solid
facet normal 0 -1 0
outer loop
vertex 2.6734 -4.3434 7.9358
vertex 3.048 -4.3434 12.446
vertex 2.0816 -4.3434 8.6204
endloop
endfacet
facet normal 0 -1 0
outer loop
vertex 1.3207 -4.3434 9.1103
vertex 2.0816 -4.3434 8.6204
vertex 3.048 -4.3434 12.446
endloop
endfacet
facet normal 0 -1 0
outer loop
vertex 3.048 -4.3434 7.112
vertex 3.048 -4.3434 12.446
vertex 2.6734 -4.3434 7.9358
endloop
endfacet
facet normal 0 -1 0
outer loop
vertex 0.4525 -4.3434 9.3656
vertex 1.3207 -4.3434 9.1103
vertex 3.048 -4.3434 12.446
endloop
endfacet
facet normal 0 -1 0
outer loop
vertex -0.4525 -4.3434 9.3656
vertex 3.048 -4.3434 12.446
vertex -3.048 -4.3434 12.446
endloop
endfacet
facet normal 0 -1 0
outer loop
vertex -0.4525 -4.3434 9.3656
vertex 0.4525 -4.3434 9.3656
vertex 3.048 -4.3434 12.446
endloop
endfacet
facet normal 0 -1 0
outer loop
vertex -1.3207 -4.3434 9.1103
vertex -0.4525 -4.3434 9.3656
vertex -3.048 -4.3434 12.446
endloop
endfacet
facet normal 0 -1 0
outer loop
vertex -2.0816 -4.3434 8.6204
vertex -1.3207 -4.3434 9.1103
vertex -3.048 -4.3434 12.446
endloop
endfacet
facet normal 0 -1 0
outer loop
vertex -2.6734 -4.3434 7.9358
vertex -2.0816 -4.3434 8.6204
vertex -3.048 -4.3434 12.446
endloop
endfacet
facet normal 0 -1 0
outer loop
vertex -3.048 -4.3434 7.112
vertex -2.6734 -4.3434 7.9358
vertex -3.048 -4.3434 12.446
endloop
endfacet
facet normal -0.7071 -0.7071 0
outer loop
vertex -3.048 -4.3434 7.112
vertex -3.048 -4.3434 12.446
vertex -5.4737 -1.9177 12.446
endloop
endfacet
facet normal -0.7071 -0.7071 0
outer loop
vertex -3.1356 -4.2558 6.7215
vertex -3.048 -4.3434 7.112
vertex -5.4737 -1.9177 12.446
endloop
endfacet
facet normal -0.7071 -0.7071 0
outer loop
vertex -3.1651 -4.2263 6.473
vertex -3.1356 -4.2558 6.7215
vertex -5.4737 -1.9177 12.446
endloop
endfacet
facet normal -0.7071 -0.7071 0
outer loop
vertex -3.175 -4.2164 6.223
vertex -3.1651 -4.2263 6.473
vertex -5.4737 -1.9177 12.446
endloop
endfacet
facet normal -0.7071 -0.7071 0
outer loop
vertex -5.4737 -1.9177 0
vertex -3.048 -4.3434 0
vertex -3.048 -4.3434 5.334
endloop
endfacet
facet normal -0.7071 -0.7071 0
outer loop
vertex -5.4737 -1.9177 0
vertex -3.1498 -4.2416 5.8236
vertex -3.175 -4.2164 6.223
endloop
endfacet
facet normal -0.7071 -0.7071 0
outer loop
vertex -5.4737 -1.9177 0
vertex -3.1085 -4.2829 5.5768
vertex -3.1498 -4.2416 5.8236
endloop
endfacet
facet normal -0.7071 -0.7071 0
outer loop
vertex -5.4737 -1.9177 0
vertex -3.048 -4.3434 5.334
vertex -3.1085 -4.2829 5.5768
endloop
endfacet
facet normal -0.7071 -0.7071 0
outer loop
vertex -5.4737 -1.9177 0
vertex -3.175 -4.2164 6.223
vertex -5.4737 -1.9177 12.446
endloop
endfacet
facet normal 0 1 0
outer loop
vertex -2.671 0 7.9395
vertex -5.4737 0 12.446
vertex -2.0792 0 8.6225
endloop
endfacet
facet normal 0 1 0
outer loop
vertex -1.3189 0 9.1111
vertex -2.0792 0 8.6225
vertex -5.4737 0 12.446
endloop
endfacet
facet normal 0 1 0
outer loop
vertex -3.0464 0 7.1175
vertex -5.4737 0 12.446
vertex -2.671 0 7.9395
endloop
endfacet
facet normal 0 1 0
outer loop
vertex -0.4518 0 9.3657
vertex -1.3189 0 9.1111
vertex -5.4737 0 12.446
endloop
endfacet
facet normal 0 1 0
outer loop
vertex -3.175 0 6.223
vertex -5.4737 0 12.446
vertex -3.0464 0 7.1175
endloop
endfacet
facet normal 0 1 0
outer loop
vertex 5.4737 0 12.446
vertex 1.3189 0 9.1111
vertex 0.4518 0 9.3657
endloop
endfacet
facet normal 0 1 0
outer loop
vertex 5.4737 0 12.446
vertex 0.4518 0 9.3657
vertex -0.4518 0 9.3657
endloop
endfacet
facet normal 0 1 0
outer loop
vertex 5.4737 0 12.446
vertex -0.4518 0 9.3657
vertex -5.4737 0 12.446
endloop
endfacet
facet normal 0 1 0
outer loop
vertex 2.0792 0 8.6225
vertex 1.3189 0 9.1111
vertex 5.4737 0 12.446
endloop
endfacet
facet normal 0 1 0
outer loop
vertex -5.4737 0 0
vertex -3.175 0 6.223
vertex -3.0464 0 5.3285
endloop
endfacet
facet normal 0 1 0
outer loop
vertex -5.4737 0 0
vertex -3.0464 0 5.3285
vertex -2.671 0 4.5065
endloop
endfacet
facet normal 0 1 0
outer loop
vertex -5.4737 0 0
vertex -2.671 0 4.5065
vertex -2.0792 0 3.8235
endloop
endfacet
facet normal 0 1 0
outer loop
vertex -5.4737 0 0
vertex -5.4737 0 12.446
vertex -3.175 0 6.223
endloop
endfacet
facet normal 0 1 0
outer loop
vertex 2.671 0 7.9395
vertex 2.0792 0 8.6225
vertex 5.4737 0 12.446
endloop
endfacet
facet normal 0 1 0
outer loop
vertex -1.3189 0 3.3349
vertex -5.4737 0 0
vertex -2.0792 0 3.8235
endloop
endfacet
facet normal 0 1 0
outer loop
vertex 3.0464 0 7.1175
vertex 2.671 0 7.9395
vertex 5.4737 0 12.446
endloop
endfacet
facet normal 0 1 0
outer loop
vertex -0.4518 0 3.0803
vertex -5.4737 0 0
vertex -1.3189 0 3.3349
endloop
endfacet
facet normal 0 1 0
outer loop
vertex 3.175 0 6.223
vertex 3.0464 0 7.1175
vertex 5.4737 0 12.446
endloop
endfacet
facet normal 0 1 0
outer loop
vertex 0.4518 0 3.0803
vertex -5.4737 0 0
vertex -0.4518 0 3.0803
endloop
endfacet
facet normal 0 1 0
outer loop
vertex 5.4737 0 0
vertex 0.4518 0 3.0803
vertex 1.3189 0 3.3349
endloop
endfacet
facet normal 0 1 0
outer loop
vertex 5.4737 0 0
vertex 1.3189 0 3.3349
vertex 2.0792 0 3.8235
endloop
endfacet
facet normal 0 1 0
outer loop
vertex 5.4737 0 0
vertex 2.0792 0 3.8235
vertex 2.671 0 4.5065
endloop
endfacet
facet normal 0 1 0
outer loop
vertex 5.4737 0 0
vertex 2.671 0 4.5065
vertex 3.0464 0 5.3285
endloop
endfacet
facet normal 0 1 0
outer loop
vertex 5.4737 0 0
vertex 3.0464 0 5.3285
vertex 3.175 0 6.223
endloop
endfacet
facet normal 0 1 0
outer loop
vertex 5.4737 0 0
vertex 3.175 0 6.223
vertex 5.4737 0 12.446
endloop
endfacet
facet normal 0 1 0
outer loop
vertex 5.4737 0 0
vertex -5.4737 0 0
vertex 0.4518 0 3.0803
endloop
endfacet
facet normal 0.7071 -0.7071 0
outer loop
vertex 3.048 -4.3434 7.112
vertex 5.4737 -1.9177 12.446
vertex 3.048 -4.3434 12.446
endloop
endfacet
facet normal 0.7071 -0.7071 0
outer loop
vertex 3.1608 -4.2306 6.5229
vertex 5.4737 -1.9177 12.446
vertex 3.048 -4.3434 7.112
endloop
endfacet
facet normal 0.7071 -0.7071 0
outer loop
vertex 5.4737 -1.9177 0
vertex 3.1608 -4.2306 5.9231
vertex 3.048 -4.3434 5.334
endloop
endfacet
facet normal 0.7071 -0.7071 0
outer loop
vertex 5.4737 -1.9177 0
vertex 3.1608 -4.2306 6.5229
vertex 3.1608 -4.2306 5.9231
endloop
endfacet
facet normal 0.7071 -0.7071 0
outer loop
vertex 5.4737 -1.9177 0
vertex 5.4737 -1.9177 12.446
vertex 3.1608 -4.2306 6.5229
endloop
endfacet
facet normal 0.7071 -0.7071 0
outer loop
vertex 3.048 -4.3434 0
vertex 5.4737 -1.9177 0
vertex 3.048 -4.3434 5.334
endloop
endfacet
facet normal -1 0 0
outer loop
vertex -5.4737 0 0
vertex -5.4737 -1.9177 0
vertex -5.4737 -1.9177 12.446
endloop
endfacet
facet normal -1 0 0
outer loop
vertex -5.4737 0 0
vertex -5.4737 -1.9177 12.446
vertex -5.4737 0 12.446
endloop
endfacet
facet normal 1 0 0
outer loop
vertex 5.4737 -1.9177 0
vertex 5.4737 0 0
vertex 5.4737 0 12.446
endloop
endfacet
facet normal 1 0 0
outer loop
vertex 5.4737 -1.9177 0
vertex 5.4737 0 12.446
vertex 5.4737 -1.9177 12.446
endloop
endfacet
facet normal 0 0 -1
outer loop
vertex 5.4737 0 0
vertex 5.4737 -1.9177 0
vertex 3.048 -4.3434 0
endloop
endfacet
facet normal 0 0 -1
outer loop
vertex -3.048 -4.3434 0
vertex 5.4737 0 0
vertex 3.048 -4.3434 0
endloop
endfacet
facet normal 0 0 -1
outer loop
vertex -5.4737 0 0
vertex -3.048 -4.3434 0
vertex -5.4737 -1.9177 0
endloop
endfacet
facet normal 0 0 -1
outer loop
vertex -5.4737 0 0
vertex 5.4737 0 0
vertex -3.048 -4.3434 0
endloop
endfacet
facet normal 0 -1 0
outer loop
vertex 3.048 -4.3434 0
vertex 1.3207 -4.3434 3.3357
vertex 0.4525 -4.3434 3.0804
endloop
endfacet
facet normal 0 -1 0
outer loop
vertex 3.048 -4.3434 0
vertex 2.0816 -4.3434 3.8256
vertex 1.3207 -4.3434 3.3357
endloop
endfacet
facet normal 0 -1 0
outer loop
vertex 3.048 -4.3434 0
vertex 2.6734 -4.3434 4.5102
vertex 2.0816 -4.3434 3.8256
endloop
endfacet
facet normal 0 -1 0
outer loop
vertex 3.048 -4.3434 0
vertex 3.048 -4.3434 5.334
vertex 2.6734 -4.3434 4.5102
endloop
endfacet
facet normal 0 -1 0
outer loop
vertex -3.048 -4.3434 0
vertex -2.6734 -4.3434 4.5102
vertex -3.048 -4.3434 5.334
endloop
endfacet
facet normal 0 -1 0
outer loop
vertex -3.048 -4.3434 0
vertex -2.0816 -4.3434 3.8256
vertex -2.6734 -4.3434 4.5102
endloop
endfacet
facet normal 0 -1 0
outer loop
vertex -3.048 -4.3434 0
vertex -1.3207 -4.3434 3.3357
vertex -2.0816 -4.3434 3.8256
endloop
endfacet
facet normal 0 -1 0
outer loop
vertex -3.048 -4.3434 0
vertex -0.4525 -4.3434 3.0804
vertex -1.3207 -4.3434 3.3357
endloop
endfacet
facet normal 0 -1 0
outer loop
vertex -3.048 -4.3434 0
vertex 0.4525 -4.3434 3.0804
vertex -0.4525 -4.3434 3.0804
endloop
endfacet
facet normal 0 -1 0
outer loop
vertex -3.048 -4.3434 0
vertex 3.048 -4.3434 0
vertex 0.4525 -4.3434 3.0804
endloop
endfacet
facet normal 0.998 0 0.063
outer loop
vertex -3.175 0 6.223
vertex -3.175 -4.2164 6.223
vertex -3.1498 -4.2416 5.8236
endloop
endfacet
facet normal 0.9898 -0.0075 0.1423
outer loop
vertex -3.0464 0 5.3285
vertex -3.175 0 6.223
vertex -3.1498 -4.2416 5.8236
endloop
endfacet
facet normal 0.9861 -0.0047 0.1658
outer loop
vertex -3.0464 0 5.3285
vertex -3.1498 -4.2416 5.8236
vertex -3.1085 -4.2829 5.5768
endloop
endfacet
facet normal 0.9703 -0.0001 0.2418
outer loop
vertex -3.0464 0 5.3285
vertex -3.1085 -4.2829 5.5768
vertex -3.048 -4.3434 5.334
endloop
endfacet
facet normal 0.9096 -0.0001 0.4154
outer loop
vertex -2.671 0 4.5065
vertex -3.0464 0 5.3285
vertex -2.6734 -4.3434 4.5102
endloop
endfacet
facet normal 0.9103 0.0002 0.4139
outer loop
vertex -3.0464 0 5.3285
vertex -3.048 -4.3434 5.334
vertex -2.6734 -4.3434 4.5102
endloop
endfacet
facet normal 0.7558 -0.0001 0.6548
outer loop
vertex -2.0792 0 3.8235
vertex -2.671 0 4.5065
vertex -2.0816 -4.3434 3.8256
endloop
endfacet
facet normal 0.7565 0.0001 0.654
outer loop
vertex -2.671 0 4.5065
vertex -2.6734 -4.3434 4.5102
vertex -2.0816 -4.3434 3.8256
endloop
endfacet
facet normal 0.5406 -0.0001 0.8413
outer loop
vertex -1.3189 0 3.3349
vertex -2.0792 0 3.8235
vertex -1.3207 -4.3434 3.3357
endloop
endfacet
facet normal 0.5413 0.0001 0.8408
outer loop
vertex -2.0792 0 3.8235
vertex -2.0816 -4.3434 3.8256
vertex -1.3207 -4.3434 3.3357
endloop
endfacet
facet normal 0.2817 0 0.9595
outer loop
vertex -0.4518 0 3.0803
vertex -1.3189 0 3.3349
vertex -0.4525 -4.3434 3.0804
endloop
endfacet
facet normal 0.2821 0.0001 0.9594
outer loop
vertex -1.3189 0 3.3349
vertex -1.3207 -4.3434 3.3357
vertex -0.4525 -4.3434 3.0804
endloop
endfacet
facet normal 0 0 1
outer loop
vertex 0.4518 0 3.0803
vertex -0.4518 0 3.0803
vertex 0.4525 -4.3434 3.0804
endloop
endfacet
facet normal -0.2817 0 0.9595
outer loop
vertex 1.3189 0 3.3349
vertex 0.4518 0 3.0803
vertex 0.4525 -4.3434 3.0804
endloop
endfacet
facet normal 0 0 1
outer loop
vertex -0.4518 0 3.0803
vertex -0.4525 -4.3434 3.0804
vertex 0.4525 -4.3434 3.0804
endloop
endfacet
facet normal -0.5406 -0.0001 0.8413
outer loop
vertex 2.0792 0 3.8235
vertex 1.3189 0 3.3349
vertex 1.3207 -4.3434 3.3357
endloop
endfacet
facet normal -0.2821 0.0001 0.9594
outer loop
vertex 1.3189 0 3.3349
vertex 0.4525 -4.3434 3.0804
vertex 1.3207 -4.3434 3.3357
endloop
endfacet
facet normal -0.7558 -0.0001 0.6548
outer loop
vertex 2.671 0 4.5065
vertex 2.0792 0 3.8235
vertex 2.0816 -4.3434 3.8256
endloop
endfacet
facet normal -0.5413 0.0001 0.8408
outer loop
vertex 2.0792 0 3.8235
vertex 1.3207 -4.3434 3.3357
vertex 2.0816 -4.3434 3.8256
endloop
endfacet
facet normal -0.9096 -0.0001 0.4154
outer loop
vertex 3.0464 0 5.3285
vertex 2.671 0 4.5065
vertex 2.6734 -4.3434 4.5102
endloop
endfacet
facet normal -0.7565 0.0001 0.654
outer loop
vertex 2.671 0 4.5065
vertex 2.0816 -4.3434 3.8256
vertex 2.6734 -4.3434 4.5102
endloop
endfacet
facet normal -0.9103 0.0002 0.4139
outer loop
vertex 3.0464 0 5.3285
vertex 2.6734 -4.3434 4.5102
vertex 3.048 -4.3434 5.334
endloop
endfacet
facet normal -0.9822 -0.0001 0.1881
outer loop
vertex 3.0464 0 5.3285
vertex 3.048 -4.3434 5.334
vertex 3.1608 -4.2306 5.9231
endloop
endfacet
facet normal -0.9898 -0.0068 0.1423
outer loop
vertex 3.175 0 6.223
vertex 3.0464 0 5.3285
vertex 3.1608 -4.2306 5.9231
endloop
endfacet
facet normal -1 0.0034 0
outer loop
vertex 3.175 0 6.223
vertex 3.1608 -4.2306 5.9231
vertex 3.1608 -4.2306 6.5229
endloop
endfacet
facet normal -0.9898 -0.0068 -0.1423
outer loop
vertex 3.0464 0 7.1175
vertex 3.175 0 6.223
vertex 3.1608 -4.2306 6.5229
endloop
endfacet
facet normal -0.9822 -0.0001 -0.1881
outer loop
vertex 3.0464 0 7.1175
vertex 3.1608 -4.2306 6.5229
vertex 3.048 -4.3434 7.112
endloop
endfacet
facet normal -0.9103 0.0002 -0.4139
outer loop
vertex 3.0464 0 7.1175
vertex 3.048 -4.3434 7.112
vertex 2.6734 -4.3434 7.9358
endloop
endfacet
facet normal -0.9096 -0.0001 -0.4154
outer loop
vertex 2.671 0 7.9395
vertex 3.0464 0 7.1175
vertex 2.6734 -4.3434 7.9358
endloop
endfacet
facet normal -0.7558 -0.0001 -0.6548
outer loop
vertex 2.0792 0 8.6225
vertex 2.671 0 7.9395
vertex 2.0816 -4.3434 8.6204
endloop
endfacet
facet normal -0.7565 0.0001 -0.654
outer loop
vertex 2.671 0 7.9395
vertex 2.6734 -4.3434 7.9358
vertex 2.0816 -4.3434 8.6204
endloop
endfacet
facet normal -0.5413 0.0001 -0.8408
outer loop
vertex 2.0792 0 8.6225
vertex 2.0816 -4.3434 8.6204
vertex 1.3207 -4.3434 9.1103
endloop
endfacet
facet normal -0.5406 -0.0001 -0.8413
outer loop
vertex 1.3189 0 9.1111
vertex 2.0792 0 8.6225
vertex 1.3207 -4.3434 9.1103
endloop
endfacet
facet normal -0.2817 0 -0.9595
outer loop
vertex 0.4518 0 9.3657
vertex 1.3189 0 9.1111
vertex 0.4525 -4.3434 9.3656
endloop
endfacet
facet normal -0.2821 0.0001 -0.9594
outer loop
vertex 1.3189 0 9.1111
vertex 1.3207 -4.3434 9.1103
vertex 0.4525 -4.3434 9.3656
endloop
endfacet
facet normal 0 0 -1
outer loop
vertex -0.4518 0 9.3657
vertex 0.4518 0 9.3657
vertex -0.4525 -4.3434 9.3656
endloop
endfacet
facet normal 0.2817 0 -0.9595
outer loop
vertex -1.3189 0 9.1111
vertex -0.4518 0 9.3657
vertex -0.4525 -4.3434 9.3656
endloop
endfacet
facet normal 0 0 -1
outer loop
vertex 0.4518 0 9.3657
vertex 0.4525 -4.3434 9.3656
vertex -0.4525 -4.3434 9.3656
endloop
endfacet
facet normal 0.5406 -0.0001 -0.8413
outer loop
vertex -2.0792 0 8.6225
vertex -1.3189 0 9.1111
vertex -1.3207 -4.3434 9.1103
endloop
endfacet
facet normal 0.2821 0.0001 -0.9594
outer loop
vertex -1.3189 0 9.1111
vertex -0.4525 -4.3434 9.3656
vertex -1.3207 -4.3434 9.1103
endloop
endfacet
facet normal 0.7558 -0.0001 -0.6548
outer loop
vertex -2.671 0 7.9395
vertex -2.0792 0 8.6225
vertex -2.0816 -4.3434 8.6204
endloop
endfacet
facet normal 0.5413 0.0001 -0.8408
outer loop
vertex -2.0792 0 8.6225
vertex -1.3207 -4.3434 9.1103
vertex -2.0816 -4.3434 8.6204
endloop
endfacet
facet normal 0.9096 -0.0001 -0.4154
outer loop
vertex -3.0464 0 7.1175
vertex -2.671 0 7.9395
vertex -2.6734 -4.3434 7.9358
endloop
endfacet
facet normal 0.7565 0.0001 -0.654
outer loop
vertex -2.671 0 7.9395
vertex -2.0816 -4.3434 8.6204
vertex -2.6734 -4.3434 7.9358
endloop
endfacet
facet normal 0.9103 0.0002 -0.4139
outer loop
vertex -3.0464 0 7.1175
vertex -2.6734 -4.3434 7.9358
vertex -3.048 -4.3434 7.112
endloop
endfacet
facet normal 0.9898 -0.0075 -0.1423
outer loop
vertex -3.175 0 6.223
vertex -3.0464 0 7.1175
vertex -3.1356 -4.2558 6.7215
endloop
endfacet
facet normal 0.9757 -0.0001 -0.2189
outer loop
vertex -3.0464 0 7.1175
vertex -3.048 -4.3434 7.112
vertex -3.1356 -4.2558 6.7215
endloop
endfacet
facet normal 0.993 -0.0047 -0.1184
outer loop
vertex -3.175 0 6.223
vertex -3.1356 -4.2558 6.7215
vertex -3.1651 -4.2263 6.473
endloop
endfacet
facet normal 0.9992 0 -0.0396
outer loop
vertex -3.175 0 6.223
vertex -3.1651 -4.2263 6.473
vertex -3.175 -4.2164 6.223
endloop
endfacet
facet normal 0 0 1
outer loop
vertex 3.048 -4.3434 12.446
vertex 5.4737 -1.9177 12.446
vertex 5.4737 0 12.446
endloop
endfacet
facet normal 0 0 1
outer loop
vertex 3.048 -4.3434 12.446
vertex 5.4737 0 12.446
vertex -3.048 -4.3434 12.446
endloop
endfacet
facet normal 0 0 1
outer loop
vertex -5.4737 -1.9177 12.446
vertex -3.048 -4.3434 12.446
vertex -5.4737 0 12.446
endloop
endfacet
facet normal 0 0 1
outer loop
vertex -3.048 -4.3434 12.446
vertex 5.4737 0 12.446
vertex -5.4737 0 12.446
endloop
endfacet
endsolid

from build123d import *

# Parameters (mm, degrees)
BOSS_EXTRUDE1_DEPTH         = 12.446
F_1_4_0_25_DIAMETER_HOLE1_D = 6.35


with BuildPart() as part:
    # Sketch1 → Boss-Extrude1 (new body)
    with BuildSketch(Plane.XY):
        Polygon((-5.4737, 0), (5.4737, 0), (5.4737, -1.9177), (3.048, -4.3434), (-3.048, -4.3434), (-5.4737, -1.9177), align=None)
    extrude(amount=BOSS_EXTRUDE1_DEPTH)

    # 1/4 (0.25) Diameter Hole1 (through all)
    with Locations(Plane(origin=(0, 0, 0), x_dir=(1, 0, 0), z_dir=(0, 1, 0))):
        with Locations((0, -6.223)):
            Hole(F_1_4_0_25_DIAMETER_HOLE1_D / 2)


solid = part.part
